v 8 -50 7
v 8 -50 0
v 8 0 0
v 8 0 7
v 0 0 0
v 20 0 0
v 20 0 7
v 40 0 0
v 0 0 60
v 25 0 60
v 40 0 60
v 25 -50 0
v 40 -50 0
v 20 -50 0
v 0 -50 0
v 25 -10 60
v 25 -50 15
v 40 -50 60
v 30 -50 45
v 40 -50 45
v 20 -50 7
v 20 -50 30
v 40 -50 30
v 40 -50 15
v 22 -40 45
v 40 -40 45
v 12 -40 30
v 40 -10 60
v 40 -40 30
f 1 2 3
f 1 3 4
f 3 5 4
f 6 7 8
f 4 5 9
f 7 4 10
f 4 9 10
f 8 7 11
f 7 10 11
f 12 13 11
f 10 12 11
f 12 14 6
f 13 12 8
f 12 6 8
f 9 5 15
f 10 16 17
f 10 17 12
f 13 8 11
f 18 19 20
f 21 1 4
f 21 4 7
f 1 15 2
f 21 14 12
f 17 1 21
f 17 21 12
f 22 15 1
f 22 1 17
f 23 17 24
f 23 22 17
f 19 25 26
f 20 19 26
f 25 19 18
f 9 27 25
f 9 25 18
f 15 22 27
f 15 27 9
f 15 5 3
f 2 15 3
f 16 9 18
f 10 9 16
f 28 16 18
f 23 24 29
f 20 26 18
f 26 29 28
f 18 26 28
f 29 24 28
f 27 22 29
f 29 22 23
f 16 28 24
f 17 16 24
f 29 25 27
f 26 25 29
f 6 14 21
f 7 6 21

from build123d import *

# Parameters (mm, degrees)
F0_W     = 40
F0_H     = 60
F1_DEPTH = 50
F4_W     = 12
F4_H     = 7
F5_DEPTH = 50.0010001
F6_W     = 40
F6_H     = 15
F7_DEPTH = 10
F9_DEPTH = 15


with BuildPart() as f1:
    # F0 (on Front) → F1 (new body)
    with BuildSketch(Plane.XZ):
        with Locations((20, 30)):
            Rectangle(F0_W, F0_H)
    extrude(amount=F1_DEPTH)

    # F2 (on face) → F3 section 0
    with BuildSketch(Plane.XY.offset(60), mode=Mode.PRIVATE) as f3_s0:
        Polygon((40, -50), (0, 0), (0, -50), align=None)
    loft([f3_s0.sketch, Vertex(0, -50, 0)], mode=Mode.SUBTRACT)

    # F4 (on face) → F5 (cut, through all)
    with BuildSketch(Plane.XZ.offset(50)):
        with Locations((14, 3.5)):
            Rectangle(F4_W, F4_H)
    extrude(amount=-F5_DEPTH, mode=Mode.SUBTRACT)

    # F6 (on face) → F7 (cut)
    with BuildSketch(Plane.XZ.offset(50)):
        with Locations((20, 37.5)):
            Rectangle(F6_W, F6_H)
    extrude(amount=-F7_DEPTH, mode=Mode.SUBTRACT)

    # F8 (on face) → F9 (cut)
    with BuildSketch(Plane.YZ.offset(40)):
        Polygon((-50, 0), (0, 60), (-10, 60), (-50, 15), align=None)
    extrude(amount=-F9_DEPTH, mode=Mode.SUBTRACT)


solid = f1.part
